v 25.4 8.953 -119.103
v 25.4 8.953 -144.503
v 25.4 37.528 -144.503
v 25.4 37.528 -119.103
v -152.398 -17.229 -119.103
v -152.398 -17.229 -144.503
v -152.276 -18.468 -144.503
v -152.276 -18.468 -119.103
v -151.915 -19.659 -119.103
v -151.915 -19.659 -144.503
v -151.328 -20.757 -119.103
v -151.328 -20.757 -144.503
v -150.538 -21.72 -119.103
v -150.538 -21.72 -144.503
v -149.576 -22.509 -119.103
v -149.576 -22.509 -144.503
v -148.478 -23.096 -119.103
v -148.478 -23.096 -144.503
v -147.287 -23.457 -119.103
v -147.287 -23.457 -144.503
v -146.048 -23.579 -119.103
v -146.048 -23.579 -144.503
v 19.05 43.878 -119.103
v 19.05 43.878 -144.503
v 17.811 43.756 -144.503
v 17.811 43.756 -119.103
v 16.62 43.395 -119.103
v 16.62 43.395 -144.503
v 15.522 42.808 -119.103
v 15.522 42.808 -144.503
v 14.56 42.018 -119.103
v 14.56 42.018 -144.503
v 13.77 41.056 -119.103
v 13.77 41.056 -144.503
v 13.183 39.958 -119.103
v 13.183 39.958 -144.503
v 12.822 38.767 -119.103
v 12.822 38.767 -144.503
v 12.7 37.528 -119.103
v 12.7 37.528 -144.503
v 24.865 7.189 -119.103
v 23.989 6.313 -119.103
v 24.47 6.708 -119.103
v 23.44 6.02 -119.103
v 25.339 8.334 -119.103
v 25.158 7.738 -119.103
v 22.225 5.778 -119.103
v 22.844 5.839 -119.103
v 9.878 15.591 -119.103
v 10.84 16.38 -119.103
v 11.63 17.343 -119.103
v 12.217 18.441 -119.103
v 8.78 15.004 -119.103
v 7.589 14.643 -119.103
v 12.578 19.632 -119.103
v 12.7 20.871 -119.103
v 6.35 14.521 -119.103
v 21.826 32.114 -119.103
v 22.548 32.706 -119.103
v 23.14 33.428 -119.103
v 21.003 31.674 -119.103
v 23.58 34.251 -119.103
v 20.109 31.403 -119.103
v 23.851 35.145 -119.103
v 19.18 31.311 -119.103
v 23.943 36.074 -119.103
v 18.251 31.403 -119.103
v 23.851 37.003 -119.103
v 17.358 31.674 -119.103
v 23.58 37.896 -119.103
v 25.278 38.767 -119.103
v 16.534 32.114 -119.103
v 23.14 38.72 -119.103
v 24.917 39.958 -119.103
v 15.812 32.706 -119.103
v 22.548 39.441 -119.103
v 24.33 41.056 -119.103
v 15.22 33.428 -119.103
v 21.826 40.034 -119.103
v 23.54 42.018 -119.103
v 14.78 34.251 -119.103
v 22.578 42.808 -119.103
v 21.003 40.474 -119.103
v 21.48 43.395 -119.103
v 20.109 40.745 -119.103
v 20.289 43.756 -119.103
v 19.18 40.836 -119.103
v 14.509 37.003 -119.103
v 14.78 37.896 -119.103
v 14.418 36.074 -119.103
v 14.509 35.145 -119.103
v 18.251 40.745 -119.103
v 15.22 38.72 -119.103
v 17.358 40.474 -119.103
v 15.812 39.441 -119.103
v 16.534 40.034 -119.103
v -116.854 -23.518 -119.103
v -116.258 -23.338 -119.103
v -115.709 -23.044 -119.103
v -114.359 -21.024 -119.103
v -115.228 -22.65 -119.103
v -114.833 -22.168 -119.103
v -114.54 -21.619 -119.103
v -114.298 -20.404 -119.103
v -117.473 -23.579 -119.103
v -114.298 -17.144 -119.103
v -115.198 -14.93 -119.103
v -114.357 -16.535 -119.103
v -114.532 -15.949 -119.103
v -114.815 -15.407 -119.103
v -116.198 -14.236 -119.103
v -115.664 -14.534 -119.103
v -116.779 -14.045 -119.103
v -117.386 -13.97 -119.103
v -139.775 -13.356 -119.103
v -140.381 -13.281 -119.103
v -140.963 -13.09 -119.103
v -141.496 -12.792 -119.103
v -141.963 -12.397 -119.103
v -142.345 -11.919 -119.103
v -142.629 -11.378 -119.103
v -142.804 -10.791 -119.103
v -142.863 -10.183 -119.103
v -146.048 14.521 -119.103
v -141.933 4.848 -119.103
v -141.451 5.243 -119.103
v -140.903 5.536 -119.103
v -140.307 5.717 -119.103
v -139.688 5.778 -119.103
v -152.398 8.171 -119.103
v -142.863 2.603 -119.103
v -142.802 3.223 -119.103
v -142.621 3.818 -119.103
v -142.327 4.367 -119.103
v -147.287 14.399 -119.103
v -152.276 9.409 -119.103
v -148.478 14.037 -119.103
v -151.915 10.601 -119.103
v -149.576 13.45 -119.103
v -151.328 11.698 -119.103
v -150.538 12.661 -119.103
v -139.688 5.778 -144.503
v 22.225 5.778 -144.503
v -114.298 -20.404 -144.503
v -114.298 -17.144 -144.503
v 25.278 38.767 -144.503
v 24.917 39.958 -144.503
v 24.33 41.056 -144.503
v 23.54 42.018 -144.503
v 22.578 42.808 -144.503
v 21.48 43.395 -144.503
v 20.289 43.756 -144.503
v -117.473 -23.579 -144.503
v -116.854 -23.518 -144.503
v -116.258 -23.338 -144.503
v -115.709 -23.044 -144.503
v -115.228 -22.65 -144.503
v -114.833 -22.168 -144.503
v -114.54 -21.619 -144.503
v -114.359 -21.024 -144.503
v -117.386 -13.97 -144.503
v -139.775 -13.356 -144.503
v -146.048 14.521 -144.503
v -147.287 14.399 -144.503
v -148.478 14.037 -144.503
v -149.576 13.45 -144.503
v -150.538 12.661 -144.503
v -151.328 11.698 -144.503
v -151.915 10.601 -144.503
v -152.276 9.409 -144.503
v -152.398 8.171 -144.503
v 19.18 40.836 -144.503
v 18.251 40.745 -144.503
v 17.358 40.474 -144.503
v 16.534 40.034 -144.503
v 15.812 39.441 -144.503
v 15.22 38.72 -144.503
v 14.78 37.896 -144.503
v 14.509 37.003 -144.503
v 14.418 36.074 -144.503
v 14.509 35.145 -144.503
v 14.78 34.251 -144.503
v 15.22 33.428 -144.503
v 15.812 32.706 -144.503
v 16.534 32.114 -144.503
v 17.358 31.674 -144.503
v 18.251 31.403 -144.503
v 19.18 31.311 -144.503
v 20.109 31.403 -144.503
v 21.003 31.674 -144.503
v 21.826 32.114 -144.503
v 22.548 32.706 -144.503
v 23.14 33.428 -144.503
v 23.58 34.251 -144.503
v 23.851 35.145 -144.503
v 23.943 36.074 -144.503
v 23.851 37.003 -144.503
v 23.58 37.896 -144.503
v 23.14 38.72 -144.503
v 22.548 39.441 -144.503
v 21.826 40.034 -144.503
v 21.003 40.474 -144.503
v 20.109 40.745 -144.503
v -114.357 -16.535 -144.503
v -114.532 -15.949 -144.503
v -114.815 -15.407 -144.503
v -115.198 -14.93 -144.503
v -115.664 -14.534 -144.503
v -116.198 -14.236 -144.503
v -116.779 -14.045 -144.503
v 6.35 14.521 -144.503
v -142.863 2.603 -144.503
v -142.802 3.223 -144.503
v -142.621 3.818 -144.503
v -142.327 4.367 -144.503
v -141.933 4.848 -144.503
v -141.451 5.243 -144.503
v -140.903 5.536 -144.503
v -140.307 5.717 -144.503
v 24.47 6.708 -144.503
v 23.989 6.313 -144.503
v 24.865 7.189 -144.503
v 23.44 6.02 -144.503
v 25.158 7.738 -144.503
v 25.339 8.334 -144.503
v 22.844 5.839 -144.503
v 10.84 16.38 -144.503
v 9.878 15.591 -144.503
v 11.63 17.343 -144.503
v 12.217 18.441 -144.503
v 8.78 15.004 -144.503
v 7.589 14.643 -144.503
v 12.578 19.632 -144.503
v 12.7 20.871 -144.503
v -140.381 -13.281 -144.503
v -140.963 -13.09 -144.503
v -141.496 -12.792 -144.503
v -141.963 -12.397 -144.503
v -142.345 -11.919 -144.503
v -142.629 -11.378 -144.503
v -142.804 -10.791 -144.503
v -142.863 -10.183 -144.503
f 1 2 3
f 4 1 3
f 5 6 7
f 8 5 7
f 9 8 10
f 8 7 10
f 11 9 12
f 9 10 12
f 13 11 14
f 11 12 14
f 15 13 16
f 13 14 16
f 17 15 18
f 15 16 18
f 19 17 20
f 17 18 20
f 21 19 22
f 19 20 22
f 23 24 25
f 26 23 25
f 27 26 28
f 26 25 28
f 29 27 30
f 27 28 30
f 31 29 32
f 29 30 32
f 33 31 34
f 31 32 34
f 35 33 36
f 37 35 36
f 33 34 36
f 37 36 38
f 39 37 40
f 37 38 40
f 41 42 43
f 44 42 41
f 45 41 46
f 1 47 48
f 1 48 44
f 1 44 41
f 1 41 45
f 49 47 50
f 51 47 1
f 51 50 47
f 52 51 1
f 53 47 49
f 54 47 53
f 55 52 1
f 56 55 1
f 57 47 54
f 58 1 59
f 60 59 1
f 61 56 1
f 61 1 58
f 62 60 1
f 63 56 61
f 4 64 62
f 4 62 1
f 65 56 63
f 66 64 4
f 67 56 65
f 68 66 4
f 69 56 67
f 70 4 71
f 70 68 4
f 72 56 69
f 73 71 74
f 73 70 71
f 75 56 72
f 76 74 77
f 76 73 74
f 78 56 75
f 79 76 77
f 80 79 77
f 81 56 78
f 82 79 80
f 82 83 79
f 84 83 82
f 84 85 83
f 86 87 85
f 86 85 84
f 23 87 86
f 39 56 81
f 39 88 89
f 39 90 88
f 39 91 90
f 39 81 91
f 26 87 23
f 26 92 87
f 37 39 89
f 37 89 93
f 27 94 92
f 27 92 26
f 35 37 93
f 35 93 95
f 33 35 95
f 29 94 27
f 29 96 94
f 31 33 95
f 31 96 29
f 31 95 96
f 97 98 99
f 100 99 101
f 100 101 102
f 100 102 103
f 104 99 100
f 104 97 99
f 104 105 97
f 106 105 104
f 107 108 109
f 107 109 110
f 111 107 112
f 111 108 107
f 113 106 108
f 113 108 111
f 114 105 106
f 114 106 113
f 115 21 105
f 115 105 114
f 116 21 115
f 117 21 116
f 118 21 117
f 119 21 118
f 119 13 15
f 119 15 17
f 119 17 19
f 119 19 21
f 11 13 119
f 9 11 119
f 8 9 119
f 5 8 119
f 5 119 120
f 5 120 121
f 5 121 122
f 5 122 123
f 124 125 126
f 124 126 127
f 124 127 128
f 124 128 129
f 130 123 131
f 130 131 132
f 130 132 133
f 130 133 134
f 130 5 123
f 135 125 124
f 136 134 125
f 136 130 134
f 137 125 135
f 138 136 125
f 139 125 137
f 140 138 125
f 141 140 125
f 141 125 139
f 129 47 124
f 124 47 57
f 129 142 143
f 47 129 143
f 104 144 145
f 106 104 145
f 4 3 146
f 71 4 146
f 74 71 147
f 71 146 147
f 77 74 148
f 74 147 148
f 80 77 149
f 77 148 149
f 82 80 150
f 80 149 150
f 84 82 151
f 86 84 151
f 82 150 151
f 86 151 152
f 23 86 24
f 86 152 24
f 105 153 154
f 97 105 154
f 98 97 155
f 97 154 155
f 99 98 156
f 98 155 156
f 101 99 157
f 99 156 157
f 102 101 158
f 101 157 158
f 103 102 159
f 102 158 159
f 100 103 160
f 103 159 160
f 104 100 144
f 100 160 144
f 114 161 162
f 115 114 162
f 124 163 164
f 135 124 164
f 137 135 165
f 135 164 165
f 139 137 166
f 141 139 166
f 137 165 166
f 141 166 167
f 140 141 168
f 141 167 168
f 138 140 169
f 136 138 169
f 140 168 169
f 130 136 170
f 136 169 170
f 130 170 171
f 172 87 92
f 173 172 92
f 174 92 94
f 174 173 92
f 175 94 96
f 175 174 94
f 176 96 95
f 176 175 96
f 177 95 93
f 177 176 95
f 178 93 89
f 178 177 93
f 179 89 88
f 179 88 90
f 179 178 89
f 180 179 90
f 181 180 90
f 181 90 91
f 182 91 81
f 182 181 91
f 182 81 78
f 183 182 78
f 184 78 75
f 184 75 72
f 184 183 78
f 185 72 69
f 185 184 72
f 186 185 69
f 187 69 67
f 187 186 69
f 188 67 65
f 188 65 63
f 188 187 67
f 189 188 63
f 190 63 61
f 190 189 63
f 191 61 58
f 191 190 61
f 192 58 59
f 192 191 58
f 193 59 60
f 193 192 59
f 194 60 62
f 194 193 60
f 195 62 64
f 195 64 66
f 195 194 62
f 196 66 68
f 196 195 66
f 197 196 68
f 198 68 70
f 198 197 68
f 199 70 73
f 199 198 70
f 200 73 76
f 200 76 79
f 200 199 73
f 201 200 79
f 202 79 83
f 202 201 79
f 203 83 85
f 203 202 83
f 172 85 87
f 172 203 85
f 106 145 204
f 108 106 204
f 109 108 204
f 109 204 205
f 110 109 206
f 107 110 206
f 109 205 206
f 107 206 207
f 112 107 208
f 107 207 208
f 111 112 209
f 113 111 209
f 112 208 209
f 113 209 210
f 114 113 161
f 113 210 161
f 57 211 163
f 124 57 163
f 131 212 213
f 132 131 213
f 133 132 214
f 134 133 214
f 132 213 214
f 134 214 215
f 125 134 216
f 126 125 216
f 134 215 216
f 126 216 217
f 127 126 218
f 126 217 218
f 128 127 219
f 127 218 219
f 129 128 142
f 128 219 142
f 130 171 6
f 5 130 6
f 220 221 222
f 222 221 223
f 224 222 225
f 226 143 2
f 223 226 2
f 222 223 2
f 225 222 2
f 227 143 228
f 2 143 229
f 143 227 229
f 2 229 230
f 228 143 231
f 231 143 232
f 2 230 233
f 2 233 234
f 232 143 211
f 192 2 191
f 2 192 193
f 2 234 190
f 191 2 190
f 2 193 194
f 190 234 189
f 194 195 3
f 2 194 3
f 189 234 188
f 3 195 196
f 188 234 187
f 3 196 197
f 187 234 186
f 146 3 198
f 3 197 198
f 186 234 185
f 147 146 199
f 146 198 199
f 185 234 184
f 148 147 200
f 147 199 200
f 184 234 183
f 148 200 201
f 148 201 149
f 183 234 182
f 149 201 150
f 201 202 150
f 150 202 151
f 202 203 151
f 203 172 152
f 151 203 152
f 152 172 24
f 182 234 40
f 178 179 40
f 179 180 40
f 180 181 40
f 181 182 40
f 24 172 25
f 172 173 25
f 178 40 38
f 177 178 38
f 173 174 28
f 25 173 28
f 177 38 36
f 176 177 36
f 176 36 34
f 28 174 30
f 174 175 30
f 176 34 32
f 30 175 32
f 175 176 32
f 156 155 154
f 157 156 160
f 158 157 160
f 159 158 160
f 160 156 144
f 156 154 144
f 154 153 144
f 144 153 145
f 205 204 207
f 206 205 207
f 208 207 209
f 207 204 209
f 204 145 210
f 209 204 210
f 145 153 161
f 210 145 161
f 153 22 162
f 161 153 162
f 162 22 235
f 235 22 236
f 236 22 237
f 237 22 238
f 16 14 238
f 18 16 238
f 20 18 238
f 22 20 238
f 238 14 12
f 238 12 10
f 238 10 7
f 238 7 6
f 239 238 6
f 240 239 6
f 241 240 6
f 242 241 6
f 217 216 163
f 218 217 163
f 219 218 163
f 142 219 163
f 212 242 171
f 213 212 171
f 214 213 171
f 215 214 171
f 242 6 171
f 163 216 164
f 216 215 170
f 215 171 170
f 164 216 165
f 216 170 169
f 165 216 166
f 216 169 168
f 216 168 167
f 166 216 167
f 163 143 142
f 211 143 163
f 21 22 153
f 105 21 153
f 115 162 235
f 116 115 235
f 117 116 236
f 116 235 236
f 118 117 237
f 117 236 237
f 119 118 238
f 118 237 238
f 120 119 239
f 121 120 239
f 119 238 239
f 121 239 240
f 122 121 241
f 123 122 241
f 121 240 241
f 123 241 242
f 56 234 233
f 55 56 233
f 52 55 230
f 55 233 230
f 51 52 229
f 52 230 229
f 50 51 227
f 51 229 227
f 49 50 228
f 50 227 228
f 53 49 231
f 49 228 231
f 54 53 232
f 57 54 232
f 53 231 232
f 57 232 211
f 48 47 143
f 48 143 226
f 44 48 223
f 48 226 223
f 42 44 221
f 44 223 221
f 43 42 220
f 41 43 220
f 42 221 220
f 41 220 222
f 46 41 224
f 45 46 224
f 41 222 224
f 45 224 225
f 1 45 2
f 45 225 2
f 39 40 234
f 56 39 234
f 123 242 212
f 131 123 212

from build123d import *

# Parameters (mm, degrees)
F0_R     = 4.7625
F1_DEPTH = 25.4
F2_ANGLE = 90


with BuildPart() as f1:
    # F0 (on Right) → F1 (new body)
    with BuildSketch(Plane.YZ):
        with BuildLine():
            Line((-20.40446, 20.59559), (-17.143665, 20.59559))
            ThreePointArc((-17.143665, 20.59559), (-14.929557, 21.494991), (-13.969856, 23.683636))
            Line((-13.969856, 23.683636), (-13.356482, 46.071825))
            ThreePointArc((-13.356482, 46.071825), (-12.39678, 48.260471), (-10.182672, 49.159872))
            Line((-10.182672, 49.159872), (2.603122, 49.159872))
            ThreePointArc((2.603122, 49.159872), (4.848186, 48.229936), (5.778122, 45.984872))
            Line((5.778122, 45.984872), (5.778122, -115.927688))
            ThreePointArc((5.778122, -115.927688), (6.708058, -118.172752), (8.953122, -119.102688))
            Line((8.953122, -119.102688), (37.528122, -119.102688))
            ThreePointArc((37.528122, -119.102688), (42.01825, -117.242816), (43.878122, -112.752688))
            ThreePointArc((43.878122, -112.752688), (42.01825, -108.26256), (37.528122, -106.402688))
            Line((37.528122, -106.402688), (20.87054, -106.402688))
            ThreePointArc((20.87054, -106.402688), (16.380412, -104.542816), (14.52054, -100.052688))
            Line((14.52054, -100.052688), (14.52054, 52.34559))
            ThreePointArc((14.52054, 52.34559), (12.660668, 56.835718), (8.17054, 58.69559))
            Line((8.17054, 58.69559), (-17.22946, 58.69559))
            ThreePointArc((-17.22946, 58.69559), (-21.719588, 56.835718), (-23.57946, 52.34559))
            Line((-23.57946, 52.34559), (-23.57946, 23.77059))
            ThreePointArc((-23.57946, 23.77059), (-22.649524, 21.525526), (-20.40446, 20.59559))
        make_face()
        with Locations((36.073726, -112.88275)):
            Circle(F0_R, mode=Mode.SUBTRACT)
    extrude(amount=F1_DEPTH)


with BuildPart() as f1_1:
    # F2: moved
    add(f1.part.rotate(Axis((25.4, 23.240622, -119.102688), (0, -1, 0)), F2_ANGLE))


solid = f1_1.part
